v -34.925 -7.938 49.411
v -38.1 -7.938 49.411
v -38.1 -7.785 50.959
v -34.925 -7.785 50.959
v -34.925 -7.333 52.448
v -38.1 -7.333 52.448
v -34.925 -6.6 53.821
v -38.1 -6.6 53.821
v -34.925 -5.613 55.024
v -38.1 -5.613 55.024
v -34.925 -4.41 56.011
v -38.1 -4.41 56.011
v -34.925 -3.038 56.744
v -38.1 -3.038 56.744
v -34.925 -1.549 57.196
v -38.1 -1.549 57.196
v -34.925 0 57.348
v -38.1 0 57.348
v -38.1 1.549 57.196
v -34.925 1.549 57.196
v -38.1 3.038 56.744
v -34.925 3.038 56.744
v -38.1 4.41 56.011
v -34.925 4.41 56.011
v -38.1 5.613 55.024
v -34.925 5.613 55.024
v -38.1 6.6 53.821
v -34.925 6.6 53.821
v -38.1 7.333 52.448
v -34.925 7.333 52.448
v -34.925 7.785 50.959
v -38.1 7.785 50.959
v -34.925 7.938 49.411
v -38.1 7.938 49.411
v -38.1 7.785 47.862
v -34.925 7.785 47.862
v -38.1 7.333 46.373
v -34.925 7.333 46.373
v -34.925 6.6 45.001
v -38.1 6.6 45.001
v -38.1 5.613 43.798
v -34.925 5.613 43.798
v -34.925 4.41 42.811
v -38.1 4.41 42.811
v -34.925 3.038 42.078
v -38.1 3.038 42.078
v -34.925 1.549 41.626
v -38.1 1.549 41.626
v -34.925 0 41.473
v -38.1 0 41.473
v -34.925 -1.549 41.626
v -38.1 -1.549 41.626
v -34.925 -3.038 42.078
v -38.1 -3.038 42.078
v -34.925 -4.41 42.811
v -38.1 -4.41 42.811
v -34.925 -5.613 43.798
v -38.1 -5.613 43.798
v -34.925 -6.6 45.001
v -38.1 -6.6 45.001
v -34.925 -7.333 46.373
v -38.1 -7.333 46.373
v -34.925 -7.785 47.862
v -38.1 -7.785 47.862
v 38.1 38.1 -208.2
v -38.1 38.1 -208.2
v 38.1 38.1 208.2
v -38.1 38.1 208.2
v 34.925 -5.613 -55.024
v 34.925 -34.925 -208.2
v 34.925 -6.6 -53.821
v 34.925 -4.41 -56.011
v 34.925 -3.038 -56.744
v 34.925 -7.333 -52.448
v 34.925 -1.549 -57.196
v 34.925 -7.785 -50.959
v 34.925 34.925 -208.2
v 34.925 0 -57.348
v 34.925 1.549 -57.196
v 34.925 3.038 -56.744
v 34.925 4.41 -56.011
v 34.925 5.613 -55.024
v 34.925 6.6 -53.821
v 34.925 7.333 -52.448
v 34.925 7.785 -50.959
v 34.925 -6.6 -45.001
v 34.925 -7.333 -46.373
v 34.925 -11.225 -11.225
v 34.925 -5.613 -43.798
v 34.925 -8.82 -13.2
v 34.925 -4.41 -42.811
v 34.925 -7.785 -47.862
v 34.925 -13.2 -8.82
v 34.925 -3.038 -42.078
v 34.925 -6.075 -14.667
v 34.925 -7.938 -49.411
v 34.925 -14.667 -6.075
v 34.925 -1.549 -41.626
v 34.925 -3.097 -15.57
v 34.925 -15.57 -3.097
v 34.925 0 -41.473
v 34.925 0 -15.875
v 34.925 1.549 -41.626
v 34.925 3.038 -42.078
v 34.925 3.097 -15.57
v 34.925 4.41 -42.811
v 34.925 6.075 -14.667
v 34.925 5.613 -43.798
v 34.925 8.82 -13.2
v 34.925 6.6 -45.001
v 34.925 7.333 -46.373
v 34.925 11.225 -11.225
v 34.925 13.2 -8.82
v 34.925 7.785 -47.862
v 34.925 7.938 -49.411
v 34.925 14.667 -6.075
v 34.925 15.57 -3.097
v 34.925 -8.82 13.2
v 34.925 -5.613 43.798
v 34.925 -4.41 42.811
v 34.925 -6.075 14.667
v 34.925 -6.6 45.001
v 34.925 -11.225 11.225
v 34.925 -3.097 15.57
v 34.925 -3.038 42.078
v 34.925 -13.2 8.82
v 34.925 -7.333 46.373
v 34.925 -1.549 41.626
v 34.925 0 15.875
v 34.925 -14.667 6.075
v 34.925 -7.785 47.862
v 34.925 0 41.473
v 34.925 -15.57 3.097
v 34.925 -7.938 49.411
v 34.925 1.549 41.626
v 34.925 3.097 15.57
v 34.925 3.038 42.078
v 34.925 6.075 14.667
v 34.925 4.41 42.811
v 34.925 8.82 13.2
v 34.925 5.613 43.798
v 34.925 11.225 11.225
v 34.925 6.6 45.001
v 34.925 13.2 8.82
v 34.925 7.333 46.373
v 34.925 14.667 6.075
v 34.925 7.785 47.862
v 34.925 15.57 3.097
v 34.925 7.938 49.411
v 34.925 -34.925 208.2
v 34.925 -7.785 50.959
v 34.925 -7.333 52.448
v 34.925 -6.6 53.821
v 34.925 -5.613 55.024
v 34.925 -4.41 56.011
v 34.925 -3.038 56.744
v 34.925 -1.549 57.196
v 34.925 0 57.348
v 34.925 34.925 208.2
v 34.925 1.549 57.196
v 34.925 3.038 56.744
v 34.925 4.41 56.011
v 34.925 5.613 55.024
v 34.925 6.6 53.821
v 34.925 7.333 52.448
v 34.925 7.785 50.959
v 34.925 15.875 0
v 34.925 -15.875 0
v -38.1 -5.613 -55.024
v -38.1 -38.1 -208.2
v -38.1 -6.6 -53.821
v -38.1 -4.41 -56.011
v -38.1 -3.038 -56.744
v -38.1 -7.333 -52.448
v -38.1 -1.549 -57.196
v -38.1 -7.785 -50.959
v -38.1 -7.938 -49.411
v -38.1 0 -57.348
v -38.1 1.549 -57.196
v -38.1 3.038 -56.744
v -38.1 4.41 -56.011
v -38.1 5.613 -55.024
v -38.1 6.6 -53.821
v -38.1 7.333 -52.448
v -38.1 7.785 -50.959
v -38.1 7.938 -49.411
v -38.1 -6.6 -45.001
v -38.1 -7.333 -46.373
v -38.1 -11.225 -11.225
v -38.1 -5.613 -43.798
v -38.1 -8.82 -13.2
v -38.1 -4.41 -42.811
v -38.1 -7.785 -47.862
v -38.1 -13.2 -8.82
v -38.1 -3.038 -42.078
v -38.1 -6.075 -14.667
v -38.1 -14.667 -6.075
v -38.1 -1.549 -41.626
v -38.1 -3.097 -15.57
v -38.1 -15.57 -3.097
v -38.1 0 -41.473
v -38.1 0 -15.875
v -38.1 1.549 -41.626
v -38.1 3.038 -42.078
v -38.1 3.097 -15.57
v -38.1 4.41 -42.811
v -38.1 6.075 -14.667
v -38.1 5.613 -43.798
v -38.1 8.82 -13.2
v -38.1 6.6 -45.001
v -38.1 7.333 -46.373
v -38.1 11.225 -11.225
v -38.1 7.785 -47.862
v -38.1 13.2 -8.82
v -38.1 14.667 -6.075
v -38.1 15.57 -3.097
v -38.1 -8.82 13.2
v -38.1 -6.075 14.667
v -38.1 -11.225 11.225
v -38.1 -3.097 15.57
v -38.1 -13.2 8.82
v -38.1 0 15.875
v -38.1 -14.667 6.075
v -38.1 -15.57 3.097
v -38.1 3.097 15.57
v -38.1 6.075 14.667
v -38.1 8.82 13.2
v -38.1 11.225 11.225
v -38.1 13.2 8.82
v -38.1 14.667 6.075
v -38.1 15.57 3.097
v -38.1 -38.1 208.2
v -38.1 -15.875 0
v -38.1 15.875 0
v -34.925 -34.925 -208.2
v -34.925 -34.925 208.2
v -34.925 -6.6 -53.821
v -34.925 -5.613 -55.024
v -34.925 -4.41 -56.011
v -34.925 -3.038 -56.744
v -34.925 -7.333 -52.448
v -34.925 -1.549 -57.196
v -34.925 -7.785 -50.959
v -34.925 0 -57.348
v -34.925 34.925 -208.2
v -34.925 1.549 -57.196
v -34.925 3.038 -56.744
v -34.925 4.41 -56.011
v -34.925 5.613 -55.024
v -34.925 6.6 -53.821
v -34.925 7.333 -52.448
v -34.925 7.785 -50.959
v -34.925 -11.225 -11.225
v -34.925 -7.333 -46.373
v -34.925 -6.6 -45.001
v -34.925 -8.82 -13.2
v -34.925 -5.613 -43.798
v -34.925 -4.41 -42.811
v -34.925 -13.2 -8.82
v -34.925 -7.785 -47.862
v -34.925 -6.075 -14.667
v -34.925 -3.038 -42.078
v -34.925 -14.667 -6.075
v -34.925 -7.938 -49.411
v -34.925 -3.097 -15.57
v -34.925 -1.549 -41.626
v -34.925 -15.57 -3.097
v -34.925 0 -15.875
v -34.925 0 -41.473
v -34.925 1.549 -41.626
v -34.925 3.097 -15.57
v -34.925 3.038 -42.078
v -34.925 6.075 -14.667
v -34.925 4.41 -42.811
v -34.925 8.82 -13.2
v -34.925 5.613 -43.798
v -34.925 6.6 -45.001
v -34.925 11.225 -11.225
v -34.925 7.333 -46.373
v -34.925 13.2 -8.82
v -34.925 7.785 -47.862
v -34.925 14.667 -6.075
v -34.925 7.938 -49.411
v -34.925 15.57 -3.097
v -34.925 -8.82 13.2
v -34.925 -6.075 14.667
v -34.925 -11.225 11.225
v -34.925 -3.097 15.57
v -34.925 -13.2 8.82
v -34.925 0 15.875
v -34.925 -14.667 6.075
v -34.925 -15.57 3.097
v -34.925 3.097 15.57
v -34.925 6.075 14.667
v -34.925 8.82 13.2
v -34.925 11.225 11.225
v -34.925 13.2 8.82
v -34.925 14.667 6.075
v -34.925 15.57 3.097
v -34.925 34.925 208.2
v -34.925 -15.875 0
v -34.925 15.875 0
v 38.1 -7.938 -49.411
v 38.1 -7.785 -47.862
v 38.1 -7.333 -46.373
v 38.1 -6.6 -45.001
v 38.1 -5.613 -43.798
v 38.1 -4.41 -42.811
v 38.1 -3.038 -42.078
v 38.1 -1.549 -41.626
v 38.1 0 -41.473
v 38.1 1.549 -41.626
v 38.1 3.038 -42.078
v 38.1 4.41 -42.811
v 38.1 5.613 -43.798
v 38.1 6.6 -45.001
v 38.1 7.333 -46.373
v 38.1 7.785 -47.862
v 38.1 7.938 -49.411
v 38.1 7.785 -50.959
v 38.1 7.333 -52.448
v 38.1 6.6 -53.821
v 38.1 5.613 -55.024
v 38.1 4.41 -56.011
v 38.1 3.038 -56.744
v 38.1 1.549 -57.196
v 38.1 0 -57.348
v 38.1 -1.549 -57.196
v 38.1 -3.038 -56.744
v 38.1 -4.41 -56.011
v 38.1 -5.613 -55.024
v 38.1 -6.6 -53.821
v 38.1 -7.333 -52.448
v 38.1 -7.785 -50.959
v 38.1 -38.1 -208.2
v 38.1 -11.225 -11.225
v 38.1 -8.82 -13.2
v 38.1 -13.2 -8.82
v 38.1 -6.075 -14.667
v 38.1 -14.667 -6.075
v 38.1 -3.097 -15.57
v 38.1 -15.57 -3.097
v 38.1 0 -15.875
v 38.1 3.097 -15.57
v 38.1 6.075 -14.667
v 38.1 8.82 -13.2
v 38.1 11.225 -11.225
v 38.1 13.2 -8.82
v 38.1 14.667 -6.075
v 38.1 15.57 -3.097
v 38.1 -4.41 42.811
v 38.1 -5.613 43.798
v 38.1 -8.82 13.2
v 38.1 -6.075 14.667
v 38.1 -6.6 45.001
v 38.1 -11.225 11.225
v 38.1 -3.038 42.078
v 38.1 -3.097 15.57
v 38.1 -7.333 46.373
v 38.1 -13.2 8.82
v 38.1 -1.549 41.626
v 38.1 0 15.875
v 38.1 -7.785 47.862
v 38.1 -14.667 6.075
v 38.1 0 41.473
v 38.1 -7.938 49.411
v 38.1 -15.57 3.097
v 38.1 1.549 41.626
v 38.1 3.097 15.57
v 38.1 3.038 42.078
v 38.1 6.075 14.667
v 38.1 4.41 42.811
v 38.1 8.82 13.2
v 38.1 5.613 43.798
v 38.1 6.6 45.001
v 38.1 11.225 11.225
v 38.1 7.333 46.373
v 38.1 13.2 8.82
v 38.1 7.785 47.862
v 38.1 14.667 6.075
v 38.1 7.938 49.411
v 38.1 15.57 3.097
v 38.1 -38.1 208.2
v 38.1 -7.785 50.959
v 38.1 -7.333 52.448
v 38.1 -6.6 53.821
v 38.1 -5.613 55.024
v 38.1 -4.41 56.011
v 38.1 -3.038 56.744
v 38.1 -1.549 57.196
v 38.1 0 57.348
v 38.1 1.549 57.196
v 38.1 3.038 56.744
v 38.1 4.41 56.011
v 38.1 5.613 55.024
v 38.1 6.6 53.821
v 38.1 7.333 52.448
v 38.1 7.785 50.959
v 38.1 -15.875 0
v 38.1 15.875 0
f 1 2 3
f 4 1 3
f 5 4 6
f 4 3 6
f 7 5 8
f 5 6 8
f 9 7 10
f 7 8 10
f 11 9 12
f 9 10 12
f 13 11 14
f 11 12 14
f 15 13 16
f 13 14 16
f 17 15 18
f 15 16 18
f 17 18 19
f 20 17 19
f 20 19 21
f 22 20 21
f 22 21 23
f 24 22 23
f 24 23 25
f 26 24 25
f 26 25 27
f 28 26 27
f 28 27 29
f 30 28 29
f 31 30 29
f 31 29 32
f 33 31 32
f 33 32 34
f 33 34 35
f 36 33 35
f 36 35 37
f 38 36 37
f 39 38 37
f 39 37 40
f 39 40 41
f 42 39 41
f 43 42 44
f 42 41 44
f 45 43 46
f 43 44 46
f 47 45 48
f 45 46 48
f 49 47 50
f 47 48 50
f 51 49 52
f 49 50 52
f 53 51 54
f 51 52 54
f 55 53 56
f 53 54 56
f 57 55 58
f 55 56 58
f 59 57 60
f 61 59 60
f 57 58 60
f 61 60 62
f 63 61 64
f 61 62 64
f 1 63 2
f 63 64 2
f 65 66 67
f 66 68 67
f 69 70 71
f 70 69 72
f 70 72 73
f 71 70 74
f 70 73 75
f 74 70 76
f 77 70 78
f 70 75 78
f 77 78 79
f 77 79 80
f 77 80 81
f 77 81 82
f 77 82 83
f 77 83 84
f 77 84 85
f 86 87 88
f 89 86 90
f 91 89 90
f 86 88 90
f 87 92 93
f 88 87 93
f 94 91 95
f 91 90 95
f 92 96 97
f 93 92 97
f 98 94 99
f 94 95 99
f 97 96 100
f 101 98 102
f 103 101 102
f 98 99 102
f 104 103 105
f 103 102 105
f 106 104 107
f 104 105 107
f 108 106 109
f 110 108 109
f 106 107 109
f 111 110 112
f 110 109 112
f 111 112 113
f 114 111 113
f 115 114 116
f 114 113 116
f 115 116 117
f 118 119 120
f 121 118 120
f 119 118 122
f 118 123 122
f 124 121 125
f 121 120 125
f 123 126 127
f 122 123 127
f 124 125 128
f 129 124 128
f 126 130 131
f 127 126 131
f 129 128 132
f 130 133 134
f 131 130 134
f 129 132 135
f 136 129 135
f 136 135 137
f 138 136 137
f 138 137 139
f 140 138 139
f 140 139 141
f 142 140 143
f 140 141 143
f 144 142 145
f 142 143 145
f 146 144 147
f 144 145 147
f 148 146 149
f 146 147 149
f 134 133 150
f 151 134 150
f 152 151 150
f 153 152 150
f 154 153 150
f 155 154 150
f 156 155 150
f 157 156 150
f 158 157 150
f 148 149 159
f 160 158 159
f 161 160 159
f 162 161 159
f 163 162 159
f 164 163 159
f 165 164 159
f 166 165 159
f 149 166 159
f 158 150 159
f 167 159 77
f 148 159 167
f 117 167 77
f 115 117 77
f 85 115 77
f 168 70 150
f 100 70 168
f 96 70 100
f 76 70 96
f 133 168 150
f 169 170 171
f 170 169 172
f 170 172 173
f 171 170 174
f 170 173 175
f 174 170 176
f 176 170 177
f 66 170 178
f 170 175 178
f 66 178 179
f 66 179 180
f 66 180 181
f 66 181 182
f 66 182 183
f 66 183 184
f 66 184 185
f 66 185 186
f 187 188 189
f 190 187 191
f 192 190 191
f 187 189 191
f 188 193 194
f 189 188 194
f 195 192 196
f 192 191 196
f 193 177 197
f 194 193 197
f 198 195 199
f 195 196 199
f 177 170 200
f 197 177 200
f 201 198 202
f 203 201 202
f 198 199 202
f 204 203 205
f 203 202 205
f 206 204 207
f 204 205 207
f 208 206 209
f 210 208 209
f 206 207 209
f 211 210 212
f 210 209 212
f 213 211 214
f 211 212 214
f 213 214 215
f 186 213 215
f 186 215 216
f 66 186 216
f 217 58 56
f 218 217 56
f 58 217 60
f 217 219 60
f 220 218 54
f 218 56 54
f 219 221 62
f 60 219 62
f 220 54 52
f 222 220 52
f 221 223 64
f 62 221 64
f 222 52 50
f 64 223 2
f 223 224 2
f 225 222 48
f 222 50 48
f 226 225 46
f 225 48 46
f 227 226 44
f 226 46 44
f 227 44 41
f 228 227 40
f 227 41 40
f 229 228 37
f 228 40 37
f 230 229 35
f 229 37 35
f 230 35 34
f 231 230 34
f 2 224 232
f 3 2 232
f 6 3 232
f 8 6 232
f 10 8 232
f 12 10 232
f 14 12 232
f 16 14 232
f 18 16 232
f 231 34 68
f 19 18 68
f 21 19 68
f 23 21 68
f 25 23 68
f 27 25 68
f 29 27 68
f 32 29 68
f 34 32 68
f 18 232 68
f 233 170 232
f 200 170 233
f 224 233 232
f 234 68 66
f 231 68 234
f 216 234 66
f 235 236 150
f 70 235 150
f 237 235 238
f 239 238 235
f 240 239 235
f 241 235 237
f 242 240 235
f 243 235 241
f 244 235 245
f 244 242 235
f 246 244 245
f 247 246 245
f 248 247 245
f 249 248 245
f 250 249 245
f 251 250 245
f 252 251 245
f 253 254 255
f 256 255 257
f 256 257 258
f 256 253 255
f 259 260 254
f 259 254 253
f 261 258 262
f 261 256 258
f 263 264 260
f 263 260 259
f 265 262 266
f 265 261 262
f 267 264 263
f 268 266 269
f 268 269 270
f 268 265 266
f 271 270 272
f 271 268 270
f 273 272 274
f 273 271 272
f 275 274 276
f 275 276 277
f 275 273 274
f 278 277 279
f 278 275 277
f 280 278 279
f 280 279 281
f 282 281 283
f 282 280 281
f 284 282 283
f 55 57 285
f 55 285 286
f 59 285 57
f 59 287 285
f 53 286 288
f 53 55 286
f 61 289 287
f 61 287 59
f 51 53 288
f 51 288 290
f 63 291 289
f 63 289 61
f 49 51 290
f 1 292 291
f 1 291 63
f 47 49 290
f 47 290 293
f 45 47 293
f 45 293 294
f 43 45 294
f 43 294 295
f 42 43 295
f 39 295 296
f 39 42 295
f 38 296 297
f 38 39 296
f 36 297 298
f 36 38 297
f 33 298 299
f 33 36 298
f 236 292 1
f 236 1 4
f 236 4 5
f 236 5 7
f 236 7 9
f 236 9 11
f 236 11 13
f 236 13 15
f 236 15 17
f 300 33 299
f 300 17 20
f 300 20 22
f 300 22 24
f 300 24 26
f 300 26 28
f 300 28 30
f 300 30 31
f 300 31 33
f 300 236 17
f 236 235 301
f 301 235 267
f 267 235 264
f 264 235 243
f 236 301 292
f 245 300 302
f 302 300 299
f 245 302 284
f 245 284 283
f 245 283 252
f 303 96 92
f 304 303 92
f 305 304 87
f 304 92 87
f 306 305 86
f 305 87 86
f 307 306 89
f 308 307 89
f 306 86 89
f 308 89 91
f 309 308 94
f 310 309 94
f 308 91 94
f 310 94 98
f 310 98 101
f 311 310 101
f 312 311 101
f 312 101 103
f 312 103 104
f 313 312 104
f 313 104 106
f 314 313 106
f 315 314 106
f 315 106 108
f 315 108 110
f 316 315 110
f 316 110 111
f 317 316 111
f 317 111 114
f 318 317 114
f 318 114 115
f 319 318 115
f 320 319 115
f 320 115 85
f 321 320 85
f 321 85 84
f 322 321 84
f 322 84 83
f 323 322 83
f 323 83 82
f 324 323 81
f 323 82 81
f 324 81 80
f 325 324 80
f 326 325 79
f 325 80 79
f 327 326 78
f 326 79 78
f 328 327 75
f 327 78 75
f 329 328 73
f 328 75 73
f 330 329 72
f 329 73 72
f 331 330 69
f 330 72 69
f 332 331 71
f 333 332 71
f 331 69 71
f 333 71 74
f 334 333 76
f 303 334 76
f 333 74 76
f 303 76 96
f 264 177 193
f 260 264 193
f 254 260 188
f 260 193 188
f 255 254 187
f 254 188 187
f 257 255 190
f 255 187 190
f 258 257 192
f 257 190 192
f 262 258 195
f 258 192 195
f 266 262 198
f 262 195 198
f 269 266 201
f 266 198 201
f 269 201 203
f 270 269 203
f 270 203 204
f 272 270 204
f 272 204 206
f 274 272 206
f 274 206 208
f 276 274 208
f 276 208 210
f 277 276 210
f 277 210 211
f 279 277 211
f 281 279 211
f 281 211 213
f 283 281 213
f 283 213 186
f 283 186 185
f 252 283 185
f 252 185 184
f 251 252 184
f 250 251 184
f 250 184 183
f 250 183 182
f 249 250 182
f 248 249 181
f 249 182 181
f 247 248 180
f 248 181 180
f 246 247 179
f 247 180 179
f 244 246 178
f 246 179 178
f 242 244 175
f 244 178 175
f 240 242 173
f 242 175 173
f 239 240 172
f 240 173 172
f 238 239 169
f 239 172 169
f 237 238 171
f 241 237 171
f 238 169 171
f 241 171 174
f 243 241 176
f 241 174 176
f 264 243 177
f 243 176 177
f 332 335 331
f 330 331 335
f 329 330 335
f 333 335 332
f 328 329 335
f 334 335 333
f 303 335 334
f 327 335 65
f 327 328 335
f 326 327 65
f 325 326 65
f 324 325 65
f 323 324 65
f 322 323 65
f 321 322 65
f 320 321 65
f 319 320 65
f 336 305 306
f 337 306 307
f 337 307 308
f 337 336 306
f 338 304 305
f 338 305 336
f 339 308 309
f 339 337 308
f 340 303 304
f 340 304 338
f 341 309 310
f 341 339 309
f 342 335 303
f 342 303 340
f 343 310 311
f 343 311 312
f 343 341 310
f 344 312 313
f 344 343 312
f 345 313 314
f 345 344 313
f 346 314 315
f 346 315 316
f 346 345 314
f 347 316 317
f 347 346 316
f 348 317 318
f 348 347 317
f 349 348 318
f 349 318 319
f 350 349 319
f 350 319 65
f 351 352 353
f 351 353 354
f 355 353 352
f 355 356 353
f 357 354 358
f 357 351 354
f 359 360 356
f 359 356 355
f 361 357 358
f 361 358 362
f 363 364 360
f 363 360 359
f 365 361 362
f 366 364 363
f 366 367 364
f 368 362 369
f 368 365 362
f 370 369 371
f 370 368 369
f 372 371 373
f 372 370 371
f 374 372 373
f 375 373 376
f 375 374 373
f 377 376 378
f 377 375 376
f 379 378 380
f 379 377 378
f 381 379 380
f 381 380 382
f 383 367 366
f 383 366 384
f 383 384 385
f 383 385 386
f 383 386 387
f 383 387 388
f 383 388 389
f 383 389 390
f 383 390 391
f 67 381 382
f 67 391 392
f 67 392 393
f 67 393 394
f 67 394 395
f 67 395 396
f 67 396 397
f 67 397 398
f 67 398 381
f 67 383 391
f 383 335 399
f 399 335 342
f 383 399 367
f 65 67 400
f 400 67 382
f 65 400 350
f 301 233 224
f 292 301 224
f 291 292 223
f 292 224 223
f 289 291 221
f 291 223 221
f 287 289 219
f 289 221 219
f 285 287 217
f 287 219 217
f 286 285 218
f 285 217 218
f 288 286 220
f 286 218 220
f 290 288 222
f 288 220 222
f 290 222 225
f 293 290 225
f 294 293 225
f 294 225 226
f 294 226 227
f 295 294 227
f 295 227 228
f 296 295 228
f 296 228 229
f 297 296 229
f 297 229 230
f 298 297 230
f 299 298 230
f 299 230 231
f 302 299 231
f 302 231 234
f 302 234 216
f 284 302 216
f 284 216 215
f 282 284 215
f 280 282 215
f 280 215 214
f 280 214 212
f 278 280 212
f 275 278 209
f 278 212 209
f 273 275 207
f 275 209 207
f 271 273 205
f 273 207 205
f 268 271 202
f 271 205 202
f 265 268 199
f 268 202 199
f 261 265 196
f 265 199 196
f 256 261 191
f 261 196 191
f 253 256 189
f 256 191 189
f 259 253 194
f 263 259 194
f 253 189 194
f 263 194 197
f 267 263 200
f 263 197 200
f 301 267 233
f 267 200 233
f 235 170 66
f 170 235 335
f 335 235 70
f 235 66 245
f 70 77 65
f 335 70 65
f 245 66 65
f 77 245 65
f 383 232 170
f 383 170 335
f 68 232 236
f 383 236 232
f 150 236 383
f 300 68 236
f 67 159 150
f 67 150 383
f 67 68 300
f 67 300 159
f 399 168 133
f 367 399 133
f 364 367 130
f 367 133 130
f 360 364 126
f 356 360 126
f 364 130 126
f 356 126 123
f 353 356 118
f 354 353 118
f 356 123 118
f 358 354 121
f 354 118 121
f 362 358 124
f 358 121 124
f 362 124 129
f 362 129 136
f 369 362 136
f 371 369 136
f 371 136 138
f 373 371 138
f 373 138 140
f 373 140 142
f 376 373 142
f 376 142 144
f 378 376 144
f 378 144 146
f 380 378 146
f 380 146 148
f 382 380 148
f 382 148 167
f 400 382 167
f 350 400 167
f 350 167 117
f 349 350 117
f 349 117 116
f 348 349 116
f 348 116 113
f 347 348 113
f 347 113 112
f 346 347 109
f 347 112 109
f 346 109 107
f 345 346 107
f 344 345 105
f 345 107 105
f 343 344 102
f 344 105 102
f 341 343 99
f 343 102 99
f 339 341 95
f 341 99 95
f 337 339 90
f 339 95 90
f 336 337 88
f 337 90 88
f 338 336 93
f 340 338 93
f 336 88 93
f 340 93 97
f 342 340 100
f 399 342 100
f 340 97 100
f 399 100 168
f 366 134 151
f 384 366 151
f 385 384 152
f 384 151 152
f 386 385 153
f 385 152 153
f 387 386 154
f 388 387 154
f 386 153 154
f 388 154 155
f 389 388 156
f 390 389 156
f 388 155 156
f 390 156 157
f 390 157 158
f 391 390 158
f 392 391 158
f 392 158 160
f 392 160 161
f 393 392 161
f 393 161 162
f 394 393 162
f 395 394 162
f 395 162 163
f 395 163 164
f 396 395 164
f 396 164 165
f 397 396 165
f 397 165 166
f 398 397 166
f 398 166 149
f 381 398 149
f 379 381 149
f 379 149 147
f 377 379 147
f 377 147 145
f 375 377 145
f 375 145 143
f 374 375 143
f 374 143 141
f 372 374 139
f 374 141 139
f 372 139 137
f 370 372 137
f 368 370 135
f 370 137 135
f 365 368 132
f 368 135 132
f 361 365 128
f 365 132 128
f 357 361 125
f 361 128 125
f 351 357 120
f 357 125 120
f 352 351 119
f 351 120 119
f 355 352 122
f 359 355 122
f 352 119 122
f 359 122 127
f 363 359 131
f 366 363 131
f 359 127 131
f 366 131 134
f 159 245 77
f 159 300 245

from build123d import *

# Parameters (mm, degrees)
SKETCH2_W           = 76.2
SKETCH2_H           = 76.2
SKETCH2_W_2         = 69.85
SKETCH2_H_2         = 69.85
BOSS_EXTRUDE1_DEPTH = 208.2
SKETCH3_R           = 15.875
SKETCH3_R_2         = 7.9375
CUT_EXTRUDE1_DEPTH  = 225.956195736


with BuildPart() as part:
    # Sketch2 → Boss-Extrude1 (new, symmetric)
    with BuildSketch(Plane.XY):
        Rectangle(SKETCH2_W, SKETCH2_H)
        Rectangle(SKETCH2_W_2, SKETCH2_H_2, mode=Mode.SUBTRACT)
    extrude(amount=BOSS_EXTRUDE1_DEPTH, both=True)

    # Sketch3 → Cut-Extrude1 (cut, through all)
    with BuildSketch(Plane.ZY.offset(38.1)):
        with Locations(Location((0, 0, 0), (0, 0, 270))):
            Circle(SKETCH3_R)
        with Locations(Location((-49.4109375, 0, 0), (0, 0, 270))):
            Circle(SKETCH3_R_2)
        with Locations(Location((49.4109375, 0, 0), (0, 0, 270))):
            Circle(SKETCH3_R_2)
    extrude(amount=-CUT_EXTRUDE1_DEPTH, mode=Mode.SUBTRACT)


solid = part.part
